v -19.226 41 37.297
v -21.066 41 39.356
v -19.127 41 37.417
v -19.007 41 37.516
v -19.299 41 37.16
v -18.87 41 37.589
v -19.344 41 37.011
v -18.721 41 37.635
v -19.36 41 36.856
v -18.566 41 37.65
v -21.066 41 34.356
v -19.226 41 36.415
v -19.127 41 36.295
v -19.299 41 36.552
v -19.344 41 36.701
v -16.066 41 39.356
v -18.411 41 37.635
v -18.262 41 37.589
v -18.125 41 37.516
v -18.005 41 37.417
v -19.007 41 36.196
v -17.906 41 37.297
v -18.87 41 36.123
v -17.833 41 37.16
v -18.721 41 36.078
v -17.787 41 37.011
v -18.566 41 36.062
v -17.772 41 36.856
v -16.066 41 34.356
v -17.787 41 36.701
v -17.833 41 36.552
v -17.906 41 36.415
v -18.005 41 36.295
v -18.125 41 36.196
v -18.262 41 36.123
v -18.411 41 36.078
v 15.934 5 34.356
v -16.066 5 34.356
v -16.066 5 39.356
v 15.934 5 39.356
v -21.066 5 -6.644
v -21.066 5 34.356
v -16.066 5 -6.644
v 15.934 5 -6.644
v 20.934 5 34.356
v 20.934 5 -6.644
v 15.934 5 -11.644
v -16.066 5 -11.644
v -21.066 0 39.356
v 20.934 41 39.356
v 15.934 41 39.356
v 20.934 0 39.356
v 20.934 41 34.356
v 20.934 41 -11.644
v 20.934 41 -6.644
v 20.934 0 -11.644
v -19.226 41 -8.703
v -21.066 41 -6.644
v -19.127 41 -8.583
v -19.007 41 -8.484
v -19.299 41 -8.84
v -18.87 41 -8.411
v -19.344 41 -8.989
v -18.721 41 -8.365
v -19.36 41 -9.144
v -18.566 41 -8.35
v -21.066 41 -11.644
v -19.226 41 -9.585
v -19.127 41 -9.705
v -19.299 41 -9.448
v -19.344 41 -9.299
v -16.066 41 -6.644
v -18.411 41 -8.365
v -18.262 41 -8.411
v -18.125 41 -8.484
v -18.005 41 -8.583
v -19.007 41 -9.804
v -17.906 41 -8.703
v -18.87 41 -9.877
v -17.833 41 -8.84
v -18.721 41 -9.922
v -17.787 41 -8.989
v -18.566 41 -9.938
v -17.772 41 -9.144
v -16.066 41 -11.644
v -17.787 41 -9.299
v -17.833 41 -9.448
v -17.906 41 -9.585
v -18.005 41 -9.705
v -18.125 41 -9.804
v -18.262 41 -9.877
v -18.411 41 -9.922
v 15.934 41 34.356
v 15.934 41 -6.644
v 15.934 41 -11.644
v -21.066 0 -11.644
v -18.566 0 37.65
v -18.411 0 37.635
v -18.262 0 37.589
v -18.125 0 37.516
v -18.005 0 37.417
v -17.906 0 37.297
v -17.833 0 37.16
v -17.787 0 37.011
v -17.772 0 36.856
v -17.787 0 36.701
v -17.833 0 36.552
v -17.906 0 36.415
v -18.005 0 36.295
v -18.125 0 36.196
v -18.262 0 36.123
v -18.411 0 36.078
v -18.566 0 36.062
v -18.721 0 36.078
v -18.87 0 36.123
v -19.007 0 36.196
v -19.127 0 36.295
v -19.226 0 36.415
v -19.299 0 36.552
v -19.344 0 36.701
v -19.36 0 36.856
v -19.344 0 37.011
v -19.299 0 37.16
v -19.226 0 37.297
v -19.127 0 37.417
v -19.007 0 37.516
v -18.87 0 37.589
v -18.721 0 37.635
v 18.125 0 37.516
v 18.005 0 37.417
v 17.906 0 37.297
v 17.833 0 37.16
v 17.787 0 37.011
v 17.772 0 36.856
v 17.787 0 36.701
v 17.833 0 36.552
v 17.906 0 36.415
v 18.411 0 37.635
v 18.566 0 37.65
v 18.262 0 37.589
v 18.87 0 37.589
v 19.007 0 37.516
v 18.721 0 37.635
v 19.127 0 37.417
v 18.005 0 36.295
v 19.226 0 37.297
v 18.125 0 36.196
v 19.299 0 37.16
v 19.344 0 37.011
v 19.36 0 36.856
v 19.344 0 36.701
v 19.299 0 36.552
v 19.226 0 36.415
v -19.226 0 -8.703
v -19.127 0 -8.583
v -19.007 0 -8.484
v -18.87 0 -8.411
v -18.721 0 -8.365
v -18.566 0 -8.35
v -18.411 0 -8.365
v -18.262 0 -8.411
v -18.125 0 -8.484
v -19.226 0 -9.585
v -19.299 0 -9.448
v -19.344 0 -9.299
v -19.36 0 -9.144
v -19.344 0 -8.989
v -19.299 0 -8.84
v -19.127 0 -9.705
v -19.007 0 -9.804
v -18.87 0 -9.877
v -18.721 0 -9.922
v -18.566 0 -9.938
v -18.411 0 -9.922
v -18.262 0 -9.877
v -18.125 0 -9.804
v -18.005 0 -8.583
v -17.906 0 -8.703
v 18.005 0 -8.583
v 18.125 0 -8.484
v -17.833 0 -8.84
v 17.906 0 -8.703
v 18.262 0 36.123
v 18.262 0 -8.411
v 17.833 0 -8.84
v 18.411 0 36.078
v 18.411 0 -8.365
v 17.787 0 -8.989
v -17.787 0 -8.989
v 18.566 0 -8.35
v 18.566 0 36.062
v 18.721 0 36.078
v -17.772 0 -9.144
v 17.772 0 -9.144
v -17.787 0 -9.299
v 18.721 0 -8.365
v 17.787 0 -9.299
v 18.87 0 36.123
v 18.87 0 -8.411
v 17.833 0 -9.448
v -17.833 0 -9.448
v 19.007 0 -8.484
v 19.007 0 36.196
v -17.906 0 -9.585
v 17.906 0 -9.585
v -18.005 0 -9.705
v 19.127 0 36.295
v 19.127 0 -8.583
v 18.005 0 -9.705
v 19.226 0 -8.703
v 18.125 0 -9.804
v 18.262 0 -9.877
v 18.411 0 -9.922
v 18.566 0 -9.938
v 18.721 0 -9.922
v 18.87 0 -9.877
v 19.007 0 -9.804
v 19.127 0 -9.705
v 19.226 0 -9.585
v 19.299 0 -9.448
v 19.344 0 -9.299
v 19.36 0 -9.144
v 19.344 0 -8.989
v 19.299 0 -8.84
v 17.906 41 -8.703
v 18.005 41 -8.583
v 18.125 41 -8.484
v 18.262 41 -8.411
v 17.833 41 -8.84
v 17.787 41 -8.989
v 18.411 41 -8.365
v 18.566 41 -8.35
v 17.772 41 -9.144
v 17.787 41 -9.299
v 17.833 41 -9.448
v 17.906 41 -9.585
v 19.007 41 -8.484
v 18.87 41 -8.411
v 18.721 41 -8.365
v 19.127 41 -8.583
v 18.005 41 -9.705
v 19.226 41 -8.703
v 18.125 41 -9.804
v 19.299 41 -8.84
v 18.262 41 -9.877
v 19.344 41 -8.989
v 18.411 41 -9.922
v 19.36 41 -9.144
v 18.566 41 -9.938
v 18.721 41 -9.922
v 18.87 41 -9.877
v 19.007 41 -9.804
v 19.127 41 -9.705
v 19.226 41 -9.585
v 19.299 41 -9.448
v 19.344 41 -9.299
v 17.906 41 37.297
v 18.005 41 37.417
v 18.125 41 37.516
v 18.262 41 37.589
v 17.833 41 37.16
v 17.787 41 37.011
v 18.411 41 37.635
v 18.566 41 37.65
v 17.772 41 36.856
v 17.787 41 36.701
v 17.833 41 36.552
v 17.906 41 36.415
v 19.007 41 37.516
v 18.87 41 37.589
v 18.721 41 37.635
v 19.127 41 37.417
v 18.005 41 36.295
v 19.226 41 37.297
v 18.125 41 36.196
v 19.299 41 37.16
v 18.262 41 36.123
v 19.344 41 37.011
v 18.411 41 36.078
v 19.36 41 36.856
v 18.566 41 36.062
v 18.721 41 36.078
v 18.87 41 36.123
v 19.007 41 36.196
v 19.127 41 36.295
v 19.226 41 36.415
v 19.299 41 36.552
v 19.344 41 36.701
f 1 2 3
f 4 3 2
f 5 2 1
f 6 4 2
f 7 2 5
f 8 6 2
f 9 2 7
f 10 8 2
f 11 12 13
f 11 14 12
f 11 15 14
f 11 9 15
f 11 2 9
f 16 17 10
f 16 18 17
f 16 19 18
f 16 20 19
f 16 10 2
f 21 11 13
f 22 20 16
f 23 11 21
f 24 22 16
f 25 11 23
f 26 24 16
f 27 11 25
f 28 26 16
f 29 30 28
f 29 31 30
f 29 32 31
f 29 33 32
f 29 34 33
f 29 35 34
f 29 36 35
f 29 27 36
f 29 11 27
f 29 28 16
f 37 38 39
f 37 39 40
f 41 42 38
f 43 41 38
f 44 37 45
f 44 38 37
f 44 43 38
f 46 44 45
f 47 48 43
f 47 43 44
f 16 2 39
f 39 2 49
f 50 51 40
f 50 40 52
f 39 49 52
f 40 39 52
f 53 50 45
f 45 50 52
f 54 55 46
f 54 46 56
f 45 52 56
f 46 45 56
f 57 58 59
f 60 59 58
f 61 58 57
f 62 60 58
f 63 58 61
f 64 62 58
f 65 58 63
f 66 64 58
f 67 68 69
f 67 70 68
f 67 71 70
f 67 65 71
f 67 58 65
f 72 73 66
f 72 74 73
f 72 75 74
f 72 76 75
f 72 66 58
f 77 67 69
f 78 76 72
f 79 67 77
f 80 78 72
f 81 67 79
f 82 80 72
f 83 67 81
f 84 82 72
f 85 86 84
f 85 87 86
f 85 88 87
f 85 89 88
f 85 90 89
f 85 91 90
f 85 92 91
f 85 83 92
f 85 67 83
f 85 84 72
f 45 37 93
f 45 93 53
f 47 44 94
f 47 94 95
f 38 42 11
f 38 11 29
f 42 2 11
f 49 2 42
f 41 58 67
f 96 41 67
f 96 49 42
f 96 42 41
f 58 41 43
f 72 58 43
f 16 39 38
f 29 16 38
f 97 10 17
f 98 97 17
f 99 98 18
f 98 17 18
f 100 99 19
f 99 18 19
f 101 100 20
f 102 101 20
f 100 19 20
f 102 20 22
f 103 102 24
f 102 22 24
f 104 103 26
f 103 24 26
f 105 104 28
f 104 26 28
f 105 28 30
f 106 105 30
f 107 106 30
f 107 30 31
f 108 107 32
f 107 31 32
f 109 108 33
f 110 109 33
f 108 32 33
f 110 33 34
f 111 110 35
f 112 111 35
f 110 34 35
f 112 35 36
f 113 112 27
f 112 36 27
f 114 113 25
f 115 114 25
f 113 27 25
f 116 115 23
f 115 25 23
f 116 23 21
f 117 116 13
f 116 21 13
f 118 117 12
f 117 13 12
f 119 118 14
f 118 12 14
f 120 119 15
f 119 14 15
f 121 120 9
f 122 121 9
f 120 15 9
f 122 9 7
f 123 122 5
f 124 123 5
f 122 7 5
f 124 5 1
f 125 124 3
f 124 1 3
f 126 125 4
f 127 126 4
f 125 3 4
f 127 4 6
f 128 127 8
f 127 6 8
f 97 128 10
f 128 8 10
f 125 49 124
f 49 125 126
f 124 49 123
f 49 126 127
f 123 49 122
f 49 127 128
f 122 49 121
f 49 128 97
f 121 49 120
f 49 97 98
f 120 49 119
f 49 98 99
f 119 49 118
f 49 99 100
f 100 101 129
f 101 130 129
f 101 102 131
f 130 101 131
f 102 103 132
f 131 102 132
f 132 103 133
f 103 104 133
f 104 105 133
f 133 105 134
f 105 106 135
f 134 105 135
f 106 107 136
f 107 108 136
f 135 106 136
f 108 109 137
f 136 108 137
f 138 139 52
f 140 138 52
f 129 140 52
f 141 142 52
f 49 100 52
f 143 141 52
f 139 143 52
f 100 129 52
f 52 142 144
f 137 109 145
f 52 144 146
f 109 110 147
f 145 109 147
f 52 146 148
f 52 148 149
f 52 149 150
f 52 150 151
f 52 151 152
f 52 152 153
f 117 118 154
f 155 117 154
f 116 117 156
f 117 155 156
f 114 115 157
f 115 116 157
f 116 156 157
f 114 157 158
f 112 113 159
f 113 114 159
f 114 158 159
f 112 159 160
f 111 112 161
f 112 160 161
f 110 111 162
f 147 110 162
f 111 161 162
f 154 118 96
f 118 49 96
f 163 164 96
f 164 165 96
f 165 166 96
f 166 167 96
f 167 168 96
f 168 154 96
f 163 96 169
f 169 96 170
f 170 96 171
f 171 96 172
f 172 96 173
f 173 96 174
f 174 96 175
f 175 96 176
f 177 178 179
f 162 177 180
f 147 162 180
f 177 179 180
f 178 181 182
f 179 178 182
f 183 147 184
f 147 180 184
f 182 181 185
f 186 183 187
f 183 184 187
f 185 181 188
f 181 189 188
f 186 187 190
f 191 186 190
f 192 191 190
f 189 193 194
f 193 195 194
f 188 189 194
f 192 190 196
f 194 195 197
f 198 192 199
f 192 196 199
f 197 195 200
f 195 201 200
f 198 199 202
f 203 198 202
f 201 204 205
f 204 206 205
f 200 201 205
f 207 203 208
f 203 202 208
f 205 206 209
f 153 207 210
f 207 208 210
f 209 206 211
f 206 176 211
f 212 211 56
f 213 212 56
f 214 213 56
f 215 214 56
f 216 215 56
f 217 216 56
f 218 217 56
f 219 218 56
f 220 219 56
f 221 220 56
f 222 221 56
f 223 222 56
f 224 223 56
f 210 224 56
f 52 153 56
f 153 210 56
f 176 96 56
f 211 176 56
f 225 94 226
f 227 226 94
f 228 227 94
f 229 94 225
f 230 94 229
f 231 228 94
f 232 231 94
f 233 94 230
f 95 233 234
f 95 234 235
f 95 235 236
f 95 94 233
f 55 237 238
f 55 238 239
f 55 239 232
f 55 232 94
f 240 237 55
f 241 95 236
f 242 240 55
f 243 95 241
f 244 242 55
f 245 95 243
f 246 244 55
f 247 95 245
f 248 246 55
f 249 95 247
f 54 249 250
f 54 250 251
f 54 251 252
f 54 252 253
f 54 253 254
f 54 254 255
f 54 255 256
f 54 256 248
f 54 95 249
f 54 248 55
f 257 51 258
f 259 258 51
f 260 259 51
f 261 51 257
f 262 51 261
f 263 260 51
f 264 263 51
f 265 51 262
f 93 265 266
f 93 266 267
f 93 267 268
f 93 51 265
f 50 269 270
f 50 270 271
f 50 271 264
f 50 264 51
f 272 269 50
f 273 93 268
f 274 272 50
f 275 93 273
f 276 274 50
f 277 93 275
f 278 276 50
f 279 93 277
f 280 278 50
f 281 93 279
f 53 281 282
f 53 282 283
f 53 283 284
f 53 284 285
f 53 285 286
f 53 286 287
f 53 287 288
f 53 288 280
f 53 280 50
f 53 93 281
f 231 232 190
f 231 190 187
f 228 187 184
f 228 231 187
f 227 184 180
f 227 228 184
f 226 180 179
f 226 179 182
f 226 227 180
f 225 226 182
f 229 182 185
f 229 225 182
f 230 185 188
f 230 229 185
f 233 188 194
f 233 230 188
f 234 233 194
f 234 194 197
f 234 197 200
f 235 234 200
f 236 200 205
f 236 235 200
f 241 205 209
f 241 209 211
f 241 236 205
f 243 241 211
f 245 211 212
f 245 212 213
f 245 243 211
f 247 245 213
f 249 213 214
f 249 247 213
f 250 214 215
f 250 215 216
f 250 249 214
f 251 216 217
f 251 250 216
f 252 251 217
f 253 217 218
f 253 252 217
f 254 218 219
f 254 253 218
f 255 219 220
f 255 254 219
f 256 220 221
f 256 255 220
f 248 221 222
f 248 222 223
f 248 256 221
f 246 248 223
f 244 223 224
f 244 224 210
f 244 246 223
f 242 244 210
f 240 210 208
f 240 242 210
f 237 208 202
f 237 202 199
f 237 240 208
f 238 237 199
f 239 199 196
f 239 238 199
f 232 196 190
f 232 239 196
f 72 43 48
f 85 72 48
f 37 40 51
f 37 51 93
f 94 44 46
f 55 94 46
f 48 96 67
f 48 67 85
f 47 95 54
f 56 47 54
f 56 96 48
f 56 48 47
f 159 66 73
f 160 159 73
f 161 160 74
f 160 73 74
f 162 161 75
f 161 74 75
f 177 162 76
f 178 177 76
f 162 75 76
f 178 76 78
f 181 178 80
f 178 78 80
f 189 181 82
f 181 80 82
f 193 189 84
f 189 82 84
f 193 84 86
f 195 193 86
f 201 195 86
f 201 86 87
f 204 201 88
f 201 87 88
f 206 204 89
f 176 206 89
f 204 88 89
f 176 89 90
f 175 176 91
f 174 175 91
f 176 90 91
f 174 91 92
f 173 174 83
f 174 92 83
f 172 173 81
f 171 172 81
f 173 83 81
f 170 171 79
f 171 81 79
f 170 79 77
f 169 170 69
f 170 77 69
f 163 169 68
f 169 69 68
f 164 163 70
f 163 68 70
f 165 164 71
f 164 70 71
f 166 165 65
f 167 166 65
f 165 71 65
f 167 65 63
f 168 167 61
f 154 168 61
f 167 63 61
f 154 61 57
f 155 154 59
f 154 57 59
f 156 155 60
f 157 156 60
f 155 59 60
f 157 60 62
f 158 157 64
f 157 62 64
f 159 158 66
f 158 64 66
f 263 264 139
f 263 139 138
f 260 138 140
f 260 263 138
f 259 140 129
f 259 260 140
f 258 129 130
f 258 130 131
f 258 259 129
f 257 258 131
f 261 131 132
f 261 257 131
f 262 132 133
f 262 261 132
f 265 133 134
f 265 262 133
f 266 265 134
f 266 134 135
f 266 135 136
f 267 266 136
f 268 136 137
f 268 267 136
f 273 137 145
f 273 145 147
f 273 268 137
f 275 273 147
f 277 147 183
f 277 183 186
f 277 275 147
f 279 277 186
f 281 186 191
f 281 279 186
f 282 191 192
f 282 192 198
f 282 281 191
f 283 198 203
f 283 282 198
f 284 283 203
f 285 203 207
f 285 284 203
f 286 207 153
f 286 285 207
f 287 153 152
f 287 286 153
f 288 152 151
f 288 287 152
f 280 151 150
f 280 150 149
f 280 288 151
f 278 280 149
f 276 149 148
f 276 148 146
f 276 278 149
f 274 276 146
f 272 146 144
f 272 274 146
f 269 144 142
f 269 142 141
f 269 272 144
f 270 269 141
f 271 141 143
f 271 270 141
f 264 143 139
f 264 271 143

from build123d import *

# Parameters (mm, degrees)
CROQUIS1_W                = 5
CROQUIS1_H                = 5
SALIENTE_EXTRUIR1_DEPTH   = 41
SALIENTE_EXTRUIR1_2_DEPTH = 41
SALIENTE_EXTRUIR1_3_DEPTH = 41
SALIENTE_EXTRUIR1_4_DEPTH = 41
CROQUIS2_W                = 42
CROQUIS2_H                = 51
SALIENTE_EXTRUIR2_DEPTH   = 5
CROQUIS3_R                = 0.79375
CORTAR_EXTRUIR1_DEPTH     = 41


with BuildPart() as part:
    # Croquis1 → Saliente-Extruir1 (new body)
    with BuildSketch(Plane(origin=(0, 0, 0), x_dir=(1, 0, 0), z_dir=(0, 1, 0))):
        with Locations((-18.565940407, 9.143956682)):
            Rectangle(CROQUIS1_W, CROQUIS1_H)
    extrude(amount=SALIENTE_EXTRUIR1_DEPTH)



with BuildPart() as body_2:
    # Croquis1 → Saliente-Extruir1 2 (new body)
    with BuildSketch(Plane(origin=(0, 0, 0), x_dir=(1, 0, 0), z_dir=(0, 1, 0))):
        with Locations((18.434059593, 9.143956682)):
            Rectangle(CROQUIS1_W, CROQUIS1_H)
    extrude(amount=SALIENTE_EXTRUIR1_2_DEPTH)


with BuildPart() as body_3:
    # Croquis1 → Saliente-Extruir1 3 (new body)
    with BuildSketch(Plane(origin=(0, 0, 0), x_dir=(1, 0, 0), z_dir=(0, 1, 0))):
        with Locations((-18.565940407, -36.856043318)):
            Rectangle(CROQUIS1_W, CROQUIS1_H)
    extrude(amount=SALIENTE_EXTRUIR1_3_DEPTH)


with BuildPart() as body_4:
    # Croquis1 → Saliente-Extruir1 4 (new body)
    with BuildSketch(Plane(origin=(0, 0, 0), x_dir=(1, 0, 0), z_dir=(0, 1, 0))):
        with Locations((18.434059593, -36.856043318)):
            Rectangle(CROQUIS1_W, CROQUIS1_H)
    extrude(amount=SALIENTE_EXTRUIR1_4_DEPTH)


with BuildPart() as part_1:
    add(part.part)

    add(body_2.part)  # Saliente-Extruir2 merges body 2

    add(body_3.part)  # Saliente-Extruir2 merges body 3

    add(body_4.part)  # Saliente-Extruir2 merges body 4
    # Croquis2 → Saliente-Extruir2 (add)
    with BuildSketch(Plane(origin=(0, 0, 0), x_dir=(1, 0, 0), z_dir=(0, 1, 0))):
        with Locations((-0.065940407, -13.856043318)):
            Rectangle(CROQUIS2_W, CROQUIS2_H)
    extrude(amount=SALIENTE_EXTRUIR2_DEPTH)

    # Croquis3 → Cortar-Extruir1 (cut)
    with BuildSketch(Plane(origin=(0, 41, 0), x_dir=(1, 0, 0), z_dir=(0, 1, 0))):
        with Locations(Location((-18.565940407, 9.143956682, 0), (0, 0, 270))):
            Circle(CROQUIS3_R)
        with Locations(Location((-18.565940407, -36.856043318, 0), (0, 0, 270))):
            Circle(CROQUIS3_R)
    cortar_extruir1 = extrude(amount=-CORTAR_EXTRUIR1_DEPTH, mode=Mode.SUBTRACT)

    # Simetría1: Cortar-Extruir1 across plane
    add(cortar_extruir1.mirror(Plane(origin=(0, 0, 0), x_dir=(0, 0, 1), z_dir=(1, 0, 0))), mode=Mode.SUBTRACT)


solid = part_1.part
